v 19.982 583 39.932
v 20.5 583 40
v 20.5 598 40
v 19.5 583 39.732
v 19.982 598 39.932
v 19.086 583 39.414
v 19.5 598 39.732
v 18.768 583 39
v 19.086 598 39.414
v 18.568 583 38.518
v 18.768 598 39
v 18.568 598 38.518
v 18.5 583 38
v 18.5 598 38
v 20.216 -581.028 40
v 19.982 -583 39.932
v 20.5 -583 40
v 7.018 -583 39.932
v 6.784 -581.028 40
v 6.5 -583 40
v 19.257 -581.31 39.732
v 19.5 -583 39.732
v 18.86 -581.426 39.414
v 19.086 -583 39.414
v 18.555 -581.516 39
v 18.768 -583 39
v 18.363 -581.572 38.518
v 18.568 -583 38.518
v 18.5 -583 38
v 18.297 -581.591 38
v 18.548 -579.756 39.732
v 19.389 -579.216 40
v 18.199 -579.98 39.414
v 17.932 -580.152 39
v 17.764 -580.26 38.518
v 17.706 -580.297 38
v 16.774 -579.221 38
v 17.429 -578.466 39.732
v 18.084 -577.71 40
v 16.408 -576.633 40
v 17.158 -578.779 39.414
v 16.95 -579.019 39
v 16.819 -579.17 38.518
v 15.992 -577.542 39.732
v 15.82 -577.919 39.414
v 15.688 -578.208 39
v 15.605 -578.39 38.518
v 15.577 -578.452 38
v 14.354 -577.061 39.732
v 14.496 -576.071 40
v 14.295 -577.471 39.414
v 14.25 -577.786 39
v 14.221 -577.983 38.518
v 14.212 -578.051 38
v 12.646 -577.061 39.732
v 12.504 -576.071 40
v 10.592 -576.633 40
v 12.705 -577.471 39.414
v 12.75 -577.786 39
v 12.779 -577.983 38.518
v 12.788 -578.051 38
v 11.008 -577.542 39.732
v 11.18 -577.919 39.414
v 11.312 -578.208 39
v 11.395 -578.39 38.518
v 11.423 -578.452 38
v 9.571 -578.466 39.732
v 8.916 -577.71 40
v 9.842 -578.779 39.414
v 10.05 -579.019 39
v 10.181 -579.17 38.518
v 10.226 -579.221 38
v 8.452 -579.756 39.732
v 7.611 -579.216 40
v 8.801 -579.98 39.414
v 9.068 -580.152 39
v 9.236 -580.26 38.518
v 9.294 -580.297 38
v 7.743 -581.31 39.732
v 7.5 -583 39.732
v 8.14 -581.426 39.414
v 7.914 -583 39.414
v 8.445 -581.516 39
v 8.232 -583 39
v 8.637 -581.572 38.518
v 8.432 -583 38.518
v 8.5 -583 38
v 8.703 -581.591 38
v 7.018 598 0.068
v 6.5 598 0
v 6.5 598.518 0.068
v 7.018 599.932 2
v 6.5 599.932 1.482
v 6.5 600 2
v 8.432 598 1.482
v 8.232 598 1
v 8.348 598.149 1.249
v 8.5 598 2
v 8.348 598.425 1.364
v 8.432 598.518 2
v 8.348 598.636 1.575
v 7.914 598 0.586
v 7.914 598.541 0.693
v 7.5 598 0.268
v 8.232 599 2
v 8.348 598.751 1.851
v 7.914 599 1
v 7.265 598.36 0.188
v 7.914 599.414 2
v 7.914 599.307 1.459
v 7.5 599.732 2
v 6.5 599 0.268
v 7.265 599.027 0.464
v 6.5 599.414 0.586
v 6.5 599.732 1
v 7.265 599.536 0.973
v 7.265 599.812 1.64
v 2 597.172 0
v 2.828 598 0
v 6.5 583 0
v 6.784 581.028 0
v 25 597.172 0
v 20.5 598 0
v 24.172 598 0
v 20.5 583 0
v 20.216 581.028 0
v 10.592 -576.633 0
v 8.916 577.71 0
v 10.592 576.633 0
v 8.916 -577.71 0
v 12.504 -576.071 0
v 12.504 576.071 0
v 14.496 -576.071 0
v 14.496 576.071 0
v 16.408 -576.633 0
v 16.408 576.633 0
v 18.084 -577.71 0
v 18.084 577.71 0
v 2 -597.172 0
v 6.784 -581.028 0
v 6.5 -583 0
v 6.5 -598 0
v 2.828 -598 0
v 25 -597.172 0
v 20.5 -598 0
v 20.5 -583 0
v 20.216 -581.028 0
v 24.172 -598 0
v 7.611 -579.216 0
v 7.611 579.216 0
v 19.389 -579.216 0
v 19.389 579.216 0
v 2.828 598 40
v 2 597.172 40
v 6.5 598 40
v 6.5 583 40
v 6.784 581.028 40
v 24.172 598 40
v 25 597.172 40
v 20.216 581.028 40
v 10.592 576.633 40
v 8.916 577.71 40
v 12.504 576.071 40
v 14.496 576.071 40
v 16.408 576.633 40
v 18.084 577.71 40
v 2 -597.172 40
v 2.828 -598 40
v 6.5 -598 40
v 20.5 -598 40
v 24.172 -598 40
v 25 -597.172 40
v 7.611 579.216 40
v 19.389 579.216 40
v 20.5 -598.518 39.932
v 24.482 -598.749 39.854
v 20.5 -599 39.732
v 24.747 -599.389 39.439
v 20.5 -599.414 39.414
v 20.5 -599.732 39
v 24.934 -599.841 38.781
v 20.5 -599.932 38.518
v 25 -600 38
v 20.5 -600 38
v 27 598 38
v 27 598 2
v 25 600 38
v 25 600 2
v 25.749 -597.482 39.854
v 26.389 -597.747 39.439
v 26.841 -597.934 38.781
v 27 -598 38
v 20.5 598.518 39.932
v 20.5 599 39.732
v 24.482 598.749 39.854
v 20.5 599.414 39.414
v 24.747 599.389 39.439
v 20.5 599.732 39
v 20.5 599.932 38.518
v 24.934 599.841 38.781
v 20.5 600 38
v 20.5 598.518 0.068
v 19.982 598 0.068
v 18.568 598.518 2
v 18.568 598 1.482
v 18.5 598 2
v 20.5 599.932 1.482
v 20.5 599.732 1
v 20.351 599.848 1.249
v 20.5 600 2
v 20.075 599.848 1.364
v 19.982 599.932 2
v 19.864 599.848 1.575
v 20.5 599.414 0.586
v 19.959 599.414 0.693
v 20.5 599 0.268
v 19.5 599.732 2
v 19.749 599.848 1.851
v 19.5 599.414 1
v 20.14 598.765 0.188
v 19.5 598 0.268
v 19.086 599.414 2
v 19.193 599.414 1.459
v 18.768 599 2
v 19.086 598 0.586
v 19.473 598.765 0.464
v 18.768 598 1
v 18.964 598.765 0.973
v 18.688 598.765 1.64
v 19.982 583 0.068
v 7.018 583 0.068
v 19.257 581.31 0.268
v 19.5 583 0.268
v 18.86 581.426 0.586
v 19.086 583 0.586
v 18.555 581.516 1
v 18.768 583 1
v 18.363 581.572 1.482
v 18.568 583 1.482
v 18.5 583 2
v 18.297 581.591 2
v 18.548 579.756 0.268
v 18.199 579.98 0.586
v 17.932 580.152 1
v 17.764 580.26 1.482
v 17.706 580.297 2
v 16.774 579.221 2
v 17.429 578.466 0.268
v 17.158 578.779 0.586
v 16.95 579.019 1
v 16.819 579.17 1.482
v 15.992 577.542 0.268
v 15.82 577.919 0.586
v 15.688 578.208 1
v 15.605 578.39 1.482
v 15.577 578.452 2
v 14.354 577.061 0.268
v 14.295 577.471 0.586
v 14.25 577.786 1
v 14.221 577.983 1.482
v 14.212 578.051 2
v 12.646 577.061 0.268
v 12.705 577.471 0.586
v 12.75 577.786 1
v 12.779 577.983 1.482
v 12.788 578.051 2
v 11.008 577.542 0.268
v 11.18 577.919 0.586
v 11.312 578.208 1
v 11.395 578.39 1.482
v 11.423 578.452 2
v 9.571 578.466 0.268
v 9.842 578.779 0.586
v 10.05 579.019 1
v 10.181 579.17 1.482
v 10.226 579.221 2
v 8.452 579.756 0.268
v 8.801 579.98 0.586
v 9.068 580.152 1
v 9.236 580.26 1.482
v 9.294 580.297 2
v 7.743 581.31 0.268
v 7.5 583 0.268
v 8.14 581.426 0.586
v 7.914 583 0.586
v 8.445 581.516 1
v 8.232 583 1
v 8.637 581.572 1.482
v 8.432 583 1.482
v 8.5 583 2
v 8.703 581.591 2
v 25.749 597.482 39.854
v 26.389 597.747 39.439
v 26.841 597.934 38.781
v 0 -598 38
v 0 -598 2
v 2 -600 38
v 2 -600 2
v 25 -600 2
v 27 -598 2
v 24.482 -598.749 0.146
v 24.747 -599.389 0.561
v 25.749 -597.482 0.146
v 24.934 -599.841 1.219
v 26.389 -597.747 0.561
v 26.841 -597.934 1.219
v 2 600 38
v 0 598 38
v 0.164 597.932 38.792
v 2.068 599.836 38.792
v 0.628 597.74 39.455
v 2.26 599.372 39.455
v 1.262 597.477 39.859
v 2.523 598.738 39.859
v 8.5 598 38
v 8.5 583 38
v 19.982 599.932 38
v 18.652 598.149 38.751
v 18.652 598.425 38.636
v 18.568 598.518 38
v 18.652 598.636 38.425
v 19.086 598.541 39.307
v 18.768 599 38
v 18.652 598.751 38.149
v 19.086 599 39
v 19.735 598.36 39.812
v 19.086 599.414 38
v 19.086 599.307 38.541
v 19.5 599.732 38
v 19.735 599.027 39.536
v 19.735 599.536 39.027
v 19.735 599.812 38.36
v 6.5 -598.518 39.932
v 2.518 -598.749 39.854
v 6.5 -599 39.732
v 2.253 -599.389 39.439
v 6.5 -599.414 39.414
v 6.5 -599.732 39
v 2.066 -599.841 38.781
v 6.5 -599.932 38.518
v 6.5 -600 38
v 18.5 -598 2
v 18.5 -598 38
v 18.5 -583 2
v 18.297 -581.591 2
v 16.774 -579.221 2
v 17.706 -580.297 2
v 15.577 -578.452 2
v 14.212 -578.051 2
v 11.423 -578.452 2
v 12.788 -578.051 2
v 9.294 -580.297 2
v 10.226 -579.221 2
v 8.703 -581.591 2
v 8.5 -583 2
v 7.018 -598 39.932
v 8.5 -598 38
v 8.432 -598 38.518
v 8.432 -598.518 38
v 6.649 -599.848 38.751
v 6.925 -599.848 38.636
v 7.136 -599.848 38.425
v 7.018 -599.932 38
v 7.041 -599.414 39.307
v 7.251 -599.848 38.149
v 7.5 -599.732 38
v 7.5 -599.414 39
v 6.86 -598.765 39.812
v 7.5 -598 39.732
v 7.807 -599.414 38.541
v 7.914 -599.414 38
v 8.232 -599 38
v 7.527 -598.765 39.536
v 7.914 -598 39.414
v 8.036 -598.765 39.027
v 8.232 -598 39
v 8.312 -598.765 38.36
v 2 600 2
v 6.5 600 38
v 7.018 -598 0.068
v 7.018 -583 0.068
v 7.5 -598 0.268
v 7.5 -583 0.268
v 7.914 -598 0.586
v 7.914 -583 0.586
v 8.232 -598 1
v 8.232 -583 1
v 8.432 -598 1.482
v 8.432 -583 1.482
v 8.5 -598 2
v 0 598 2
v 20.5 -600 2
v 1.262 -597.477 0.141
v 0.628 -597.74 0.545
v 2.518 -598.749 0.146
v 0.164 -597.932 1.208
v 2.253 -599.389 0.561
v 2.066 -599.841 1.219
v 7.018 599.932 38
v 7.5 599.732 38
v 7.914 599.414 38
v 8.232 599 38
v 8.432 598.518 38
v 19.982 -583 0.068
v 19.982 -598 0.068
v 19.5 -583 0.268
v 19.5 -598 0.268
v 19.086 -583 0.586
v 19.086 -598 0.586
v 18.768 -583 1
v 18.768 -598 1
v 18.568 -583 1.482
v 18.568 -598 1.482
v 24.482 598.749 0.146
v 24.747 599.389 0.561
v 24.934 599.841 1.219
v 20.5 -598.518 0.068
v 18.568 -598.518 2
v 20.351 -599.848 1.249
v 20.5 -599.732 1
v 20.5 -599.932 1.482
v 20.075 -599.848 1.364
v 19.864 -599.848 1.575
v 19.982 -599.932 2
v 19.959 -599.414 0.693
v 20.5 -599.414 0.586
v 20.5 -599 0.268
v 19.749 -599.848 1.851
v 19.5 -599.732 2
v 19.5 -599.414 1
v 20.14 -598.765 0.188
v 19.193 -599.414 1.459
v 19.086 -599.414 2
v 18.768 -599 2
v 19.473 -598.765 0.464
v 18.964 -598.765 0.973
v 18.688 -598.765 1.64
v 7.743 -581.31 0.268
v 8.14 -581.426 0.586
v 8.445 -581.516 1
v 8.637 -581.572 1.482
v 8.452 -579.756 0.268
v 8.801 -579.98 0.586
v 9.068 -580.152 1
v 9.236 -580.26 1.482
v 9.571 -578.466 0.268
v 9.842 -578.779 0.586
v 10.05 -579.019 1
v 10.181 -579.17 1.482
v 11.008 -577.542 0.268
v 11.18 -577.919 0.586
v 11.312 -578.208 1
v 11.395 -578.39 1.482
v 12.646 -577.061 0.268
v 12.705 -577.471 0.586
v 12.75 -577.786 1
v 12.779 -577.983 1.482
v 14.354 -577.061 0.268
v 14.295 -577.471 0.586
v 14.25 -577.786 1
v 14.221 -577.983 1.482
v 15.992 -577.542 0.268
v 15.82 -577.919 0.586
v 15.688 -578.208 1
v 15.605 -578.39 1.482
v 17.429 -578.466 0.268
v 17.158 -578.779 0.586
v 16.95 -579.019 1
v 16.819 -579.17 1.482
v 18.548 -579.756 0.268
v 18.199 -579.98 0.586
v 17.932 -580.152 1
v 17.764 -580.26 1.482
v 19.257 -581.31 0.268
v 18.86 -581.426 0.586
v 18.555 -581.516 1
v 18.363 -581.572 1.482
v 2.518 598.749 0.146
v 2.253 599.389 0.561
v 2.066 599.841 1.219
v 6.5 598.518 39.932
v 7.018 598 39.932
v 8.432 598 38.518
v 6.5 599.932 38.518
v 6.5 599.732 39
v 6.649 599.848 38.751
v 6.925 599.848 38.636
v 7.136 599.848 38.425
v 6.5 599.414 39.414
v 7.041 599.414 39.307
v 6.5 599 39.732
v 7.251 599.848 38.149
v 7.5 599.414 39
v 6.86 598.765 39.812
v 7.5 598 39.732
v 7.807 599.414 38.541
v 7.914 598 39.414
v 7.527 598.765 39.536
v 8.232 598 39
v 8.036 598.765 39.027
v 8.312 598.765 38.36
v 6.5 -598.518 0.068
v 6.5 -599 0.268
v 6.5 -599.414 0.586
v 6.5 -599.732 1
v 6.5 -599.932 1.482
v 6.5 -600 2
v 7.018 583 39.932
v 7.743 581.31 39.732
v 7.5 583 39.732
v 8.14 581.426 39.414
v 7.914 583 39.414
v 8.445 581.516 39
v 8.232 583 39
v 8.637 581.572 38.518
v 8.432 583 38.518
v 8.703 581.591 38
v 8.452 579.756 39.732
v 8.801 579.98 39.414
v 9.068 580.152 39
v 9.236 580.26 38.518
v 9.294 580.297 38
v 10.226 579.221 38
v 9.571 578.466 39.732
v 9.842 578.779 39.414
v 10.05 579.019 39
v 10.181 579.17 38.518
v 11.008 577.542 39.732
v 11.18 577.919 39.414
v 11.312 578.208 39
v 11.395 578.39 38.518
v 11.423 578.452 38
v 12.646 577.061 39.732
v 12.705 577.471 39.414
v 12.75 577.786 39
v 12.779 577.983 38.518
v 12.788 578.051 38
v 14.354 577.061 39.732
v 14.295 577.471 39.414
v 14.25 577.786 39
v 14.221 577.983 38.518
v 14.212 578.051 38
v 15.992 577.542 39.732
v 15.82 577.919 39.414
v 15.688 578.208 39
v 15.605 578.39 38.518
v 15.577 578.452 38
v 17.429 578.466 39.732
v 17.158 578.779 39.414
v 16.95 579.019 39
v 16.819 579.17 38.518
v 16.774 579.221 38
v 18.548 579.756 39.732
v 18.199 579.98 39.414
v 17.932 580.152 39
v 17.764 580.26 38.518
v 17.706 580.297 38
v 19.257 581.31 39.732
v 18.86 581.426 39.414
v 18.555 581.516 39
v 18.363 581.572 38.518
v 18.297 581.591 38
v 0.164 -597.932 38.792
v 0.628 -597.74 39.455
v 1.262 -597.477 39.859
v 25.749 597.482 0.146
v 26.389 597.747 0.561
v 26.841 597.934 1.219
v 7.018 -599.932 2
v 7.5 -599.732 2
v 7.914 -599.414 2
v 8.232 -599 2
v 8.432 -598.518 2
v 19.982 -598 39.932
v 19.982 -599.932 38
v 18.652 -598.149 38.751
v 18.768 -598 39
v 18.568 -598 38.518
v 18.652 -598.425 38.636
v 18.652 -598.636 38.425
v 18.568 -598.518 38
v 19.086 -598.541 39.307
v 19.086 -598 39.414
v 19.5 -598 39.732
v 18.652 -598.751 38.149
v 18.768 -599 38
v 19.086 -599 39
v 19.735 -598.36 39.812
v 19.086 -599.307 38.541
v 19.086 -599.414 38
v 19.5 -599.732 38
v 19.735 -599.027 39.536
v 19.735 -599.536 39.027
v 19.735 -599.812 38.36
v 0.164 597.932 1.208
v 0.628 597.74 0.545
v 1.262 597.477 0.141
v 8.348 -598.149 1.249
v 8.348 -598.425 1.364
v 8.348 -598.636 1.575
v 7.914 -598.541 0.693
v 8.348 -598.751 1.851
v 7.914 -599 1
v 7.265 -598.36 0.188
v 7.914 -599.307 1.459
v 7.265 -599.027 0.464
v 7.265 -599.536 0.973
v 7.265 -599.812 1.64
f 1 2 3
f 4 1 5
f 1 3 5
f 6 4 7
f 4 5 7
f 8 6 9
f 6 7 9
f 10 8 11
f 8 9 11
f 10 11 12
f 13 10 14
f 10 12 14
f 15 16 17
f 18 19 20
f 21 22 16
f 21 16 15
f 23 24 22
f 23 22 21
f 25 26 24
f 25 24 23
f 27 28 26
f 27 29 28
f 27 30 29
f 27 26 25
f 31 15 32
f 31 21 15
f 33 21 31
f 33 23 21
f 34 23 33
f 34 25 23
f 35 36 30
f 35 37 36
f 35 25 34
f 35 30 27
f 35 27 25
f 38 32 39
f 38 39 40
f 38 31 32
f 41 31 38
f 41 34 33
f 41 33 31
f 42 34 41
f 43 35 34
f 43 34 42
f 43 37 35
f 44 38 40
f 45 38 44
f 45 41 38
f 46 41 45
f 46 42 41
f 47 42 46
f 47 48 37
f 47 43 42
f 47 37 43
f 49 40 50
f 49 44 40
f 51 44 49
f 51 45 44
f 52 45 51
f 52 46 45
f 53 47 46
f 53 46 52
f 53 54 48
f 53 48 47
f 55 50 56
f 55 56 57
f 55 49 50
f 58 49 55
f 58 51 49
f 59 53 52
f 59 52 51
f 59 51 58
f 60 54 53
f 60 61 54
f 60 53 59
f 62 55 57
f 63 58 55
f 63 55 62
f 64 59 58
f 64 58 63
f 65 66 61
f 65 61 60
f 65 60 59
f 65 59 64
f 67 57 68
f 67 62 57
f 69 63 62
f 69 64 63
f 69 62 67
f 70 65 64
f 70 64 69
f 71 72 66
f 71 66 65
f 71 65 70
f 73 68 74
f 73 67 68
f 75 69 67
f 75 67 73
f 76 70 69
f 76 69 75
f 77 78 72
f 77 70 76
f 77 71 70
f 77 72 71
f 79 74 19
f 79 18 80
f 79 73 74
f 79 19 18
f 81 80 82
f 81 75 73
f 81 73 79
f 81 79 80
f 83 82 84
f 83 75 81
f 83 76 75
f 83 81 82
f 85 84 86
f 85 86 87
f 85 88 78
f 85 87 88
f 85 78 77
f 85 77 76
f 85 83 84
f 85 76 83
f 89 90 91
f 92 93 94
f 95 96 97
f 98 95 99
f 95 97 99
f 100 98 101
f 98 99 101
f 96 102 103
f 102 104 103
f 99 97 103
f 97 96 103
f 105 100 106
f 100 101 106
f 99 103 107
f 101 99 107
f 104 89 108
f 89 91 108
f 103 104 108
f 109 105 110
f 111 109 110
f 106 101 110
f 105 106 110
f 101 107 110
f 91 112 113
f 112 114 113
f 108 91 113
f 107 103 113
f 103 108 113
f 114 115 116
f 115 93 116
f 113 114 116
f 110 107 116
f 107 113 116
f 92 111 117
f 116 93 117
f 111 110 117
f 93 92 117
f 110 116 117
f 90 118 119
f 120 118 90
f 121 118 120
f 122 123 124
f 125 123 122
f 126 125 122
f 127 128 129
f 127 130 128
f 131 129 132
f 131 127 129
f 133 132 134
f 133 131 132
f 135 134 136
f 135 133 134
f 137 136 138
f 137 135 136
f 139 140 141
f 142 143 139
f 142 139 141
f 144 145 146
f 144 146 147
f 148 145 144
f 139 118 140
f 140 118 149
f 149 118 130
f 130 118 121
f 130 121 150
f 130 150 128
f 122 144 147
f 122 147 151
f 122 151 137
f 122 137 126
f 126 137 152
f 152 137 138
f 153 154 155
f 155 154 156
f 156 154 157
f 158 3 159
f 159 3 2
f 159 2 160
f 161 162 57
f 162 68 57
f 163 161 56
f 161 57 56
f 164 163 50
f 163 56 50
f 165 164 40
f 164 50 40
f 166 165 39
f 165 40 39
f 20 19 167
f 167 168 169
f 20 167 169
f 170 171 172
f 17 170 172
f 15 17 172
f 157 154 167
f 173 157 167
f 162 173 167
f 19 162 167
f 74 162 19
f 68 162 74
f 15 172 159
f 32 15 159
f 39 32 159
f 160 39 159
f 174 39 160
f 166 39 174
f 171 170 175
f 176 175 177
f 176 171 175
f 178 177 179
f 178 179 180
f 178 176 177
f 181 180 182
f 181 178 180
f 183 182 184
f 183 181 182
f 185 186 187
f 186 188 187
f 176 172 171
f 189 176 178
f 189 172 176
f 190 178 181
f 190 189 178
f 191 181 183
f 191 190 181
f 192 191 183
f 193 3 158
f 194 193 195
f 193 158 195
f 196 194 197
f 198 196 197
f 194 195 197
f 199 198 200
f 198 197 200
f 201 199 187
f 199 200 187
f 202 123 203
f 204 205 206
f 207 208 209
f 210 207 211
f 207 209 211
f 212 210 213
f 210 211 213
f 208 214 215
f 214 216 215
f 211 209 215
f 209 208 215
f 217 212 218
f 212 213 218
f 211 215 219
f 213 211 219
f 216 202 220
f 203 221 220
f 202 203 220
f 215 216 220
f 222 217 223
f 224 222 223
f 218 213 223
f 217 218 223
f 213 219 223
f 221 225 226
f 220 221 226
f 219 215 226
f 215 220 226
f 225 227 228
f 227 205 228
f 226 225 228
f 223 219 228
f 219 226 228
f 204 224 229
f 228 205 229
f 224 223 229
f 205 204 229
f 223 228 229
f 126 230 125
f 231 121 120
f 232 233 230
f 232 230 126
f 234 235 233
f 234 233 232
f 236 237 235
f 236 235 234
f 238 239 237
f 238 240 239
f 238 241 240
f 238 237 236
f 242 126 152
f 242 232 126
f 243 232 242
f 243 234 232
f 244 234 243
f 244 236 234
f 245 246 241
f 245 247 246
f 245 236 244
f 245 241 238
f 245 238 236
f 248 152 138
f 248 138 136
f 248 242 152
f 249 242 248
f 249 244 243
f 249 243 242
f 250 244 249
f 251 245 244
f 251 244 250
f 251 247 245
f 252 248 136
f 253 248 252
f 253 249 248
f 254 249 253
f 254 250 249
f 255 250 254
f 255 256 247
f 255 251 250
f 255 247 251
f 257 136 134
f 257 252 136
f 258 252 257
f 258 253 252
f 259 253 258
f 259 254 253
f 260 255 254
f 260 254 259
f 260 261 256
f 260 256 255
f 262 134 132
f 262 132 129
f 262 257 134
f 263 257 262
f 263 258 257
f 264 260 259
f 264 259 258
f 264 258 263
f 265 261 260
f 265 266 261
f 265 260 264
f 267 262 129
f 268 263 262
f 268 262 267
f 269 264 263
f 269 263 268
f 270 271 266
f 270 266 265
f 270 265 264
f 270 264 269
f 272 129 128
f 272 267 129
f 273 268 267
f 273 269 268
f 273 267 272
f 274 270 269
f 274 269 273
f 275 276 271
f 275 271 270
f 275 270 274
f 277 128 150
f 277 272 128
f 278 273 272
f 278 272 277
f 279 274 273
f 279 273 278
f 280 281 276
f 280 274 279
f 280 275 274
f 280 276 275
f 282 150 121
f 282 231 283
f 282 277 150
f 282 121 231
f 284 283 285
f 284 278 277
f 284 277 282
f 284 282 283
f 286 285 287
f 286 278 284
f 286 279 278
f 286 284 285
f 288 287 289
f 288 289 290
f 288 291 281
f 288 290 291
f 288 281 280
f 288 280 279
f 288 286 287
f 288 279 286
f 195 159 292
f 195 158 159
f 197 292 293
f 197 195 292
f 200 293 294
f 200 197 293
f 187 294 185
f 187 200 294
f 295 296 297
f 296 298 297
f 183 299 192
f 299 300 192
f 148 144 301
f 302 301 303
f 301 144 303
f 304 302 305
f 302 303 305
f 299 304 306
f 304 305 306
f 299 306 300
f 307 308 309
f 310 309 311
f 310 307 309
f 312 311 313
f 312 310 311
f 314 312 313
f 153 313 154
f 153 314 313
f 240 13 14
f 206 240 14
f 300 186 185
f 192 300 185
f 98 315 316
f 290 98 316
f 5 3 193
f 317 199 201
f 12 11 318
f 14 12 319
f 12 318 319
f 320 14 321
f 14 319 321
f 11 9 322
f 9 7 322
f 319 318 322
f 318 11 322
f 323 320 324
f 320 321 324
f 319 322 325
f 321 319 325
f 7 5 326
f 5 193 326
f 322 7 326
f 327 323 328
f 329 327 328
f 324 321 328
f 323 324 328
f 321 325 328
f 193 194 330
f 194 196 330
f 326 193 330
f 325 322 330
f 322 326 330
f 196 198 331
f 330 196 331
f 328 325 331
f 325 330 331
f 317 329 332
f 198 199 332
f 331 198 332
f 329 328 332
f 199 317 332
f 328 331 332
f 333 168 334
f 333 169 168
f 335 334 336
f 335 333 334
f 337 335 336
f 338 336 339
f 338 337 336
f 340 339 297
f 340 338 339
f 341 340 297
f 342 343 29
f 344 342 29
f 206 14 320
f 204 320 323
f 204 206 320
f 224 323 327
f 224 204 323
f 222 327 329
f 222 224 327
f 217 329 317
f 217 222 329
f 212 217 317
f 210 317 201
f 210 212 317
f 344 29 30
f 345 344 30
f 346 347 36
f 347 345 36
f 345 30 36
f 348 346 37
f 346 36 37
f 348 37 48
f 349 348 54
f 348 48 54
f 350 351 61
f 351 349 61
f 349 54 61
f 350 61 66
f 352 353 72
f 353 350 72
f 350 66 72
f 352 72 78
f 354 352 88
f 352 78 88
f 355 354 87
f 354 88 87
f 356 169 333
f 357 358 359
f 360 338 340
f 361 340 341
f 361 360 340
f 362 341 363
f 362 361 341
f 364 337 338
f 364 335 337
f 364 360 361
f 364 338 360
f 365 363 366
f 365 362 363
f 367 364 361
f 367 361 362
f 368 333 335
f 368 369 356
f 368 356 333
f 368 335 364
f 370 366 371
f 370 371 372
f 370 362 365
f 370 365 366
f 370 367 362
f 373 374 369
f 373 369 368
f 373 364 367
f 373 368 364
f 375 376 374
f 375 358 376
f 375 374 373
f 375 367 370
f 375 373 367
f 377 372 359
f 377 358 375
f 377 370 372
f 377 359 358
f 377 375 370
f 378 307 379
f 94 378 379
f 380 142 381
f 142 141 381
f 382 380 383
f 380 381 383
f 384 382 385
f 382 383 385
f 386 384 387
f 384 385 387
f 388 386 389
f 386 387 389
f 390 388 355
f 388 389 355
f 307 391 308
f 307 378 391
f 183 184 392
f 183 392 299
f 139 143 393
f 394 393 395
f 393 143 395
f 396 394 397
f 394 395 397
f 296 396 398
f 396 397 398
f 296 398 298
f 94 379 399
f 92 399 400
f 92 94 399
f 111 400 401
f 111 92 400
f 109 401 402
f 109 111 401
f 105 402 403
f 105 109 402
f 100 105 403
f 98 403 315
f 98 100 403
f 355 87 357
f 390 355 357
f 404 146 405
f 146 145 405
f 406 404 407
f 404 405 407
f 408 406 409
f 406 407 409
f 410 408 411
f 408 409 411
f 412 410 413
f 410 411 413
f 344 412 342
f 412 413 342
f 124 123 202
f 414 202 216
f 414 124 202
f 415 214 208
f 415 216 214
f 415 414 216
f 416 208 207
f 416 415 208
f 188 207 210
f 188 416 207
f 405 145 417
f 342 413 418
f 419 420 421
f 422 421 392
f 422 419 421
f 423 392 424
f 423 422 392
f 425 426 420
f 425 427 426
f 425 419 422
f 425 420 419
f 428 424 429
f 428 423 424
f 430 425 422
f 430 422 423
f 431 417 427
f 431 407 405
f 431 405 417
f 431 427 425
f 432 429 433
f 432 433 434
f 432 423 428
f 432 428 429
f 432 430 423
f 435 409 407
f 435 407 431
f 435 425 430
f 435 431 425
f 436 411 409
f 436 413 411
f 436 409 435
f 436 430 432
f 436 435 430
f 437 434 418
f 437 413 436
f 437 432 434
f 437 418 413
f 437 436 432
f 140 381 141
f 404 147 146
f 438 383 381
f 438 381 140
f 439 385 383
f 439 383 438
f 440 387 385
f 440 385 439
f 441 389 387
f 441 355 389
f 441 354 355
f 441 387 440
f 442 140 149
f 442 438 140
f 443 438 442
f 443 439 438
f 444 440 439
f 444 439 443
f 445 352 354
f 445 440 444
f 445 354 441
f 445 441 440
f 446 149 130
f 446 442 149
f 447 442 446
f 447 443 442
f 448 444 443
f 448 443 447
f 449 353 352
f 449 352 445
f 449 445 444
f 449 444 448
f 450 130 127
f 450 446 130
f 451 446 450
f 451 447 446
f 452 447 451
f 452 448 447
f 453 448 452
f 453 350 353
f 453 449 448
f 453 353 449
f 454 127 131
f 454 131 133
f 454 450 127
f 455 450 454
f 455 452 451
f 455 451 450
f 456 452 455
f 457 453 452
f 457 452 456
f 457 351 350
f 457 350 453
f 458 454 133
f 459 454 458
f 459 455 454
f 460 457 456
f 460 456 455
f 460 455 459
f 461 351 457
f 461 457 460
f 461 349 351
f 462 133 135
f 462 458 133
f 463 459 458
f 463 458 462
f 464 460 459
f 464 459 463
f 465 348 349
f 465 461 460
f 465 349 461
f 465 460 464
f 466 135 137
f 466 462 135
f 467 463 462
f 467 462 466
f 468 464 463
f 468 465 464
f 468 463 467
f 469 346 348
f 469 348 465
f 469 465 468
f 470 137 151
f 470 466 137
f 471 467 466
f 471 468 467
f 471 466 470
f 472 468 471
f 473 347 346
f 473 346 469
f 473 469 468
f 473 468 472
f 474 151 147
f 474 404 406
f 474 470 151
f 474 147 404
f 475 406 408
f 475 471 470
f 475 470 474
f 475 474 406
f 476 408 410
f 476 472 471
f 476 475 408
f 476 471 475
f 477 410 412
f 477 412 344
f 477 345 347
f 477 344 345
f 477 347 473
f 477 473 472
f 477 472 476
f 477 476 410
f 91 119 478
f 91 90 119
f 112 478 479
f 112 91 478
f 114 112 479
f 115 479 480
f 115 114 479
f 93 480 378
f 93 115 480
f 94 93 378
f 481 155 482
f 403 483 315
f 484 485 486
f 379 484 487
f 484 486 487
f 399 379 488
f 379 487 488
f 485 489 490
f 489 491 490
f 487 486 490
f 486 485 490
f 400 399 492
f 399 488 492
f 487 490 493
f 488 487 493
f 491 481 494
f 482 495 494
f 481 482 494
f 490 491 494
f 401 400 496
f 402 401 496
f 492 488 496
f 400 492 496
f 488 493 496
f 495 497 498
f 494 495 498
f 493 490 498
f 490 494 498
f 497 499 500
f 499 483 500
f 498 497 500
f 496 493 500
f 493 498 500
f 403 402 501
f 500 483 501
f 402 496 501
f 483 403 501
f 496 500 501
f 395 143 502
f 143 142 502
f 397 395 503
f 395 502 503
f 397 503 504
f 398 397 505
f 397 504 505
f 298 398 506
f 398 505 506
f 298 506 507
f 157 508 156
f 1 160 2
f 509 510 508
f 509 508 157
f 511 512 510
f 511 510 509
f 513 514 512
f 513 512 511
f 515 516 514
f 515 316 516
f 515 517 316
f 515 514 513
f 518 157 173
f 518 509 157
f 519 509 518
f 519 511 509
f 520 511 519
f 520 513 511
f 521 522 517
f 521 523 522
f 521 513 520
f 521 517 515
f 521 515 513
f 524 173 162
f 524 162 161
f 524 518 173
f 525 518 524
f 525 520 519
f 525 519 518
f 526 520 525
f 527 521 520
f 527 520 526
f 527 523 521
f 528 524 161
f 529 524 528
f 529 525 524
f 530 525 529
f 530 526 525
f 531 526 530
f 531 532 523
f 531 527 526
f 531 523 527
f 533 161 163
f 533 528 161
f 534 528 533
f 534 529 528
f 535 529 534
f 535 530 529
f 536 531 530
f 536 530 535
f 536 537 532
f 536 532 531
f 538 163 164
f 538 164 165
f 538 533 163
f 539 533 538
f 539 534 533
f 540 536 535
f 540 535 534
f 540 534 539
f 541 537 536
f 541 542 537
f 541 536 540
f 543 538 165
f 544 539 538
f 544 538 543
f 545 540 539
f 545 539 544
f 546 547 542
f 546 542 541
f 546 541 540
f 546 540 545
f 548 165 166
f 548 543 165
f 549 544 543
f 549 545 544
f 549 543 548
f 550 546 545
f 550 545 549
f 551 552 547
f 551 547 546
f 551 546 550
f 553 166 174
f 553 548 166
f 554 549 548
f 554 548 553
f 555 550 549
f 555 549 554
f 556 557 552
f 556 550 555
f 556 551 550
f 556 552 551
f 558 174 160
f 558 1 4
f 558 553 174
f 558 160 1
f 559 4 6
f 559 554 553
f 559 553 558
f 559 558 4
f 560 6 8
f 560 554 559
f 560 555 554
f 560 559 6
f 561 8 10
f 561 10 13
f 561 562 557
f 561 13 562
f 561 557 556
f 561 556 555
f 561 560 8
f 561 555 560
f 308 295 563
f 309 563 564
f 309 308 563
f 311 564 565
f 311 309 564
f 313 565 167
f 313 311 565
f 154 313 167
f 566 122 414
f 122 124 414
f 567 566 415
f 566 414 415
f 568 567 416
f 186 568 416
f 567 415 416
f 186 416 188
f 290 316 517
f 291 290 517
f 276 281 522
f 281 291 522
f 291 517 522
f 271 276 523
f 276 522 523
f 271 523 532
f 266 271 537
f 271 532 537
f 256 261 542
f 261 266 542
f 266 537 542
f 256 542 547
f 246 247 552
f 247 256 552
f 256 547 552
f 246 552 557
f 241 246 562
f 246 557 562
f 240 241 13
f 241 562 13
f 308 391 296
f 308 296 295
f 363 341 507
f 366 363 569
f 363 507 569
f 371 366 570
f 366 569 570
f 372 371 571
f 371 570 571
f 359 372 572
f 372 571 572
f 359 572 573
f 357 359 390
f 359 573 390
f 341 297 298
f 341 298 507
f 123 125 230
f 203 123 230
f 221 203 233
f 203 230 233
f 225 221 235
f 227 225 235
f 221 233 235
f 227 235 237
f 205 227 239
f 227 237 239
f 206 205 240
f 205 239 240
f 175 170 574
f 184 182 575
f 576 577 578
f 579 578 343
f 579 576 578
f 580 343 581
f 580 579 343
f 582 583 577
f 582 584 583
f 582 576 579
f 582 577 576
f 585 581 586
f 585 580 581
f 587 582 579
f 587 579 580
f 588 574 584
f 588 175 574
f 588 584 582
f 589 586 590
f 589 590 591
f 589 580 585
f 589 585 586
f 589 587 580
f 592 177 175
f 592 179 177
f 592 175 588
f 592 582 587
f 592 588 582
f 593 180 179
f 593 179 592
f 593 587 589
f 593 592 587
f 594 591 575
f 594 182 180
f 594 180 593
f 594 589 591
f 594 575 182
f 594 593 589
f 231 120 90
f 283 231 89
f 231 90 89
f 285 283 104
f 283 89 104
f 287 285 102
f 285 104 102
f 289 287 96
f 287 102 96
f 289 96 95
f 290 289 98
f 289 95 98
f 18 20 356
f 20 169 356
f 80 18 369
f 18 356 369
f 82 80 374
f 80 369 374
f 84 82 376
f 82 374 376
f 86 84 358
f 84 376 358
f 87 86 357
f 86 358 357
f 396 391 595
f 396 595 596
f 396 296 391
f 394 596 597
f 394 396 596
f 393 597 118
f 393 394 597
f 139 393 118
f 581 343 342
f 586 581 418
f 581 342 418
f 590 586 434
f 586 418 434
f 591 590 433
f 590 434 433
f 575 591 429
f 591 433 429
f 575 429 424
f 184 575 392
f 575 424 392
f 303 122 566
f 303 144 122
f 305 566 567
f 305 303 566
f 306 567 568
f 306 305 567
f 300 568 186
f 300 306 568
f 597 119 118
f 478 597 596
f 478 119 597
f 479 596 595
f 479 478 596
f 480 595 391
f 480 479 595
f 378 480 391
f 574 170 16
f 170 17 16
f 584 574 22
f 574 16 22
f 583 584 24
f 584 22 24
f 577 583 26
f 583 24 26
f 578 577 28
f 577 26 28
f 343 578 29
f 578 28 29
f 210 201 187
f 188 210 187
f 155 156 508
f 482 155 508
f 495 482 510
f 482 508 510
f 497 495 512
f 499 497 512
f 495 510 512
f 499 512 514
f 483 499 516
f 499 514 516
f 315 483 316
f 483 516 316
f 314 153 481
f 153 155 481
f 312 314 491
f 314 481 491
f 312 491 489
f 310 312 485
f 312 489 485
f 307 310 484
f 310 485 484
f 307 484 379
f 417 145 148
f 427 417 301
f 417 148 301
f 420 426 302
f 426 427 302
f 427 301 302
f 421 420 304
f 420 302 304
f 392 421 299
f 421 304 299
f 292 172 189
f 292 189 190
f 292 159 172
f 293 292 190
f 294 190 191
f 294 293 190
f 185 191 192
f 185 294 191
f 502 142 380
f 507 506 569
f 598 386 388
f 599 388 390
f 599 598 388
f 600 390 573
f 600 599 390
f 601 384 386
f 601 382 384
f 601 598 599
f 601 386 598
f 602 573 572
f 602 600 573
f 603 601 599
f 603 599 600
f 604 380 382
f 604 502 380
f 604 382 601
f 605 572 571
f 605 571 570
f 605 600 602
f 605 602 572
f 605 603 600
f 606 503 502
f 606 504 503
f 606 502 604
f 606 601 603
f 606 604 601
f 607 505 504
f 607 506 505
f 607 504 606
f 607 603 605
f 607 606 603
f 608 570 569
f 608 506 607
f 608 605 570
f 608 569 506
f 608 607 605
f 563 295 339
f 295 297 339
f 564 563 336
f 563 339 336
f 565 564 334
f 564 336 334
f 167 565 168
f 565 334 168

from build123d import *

# Parameters (mm, degrees)
F0_W     = 27
F0_H     = 40
F1_DEPTH = 600
F3_DEPTH = 40.001
F4_DEPTH = 40.001
F5_SIZE  = 2
F6_R     = 2


with BuildPart() as f1:
    # F0 (on Front) → F1 (new body, symmetric)
    with BuildSketch(Plane.XZ):
        with Locations((13.5, 20)):
            Rectangle(F0_W, F0_H)
    extrude(amount=F1_DEPTH, both=True)

    # F2 (on face) → F3 (cut, through all)
    with BuildSketch(Plane.XY.offset(40)):
        with BuildLine():
            Line((18.5, -600), (18.5, -583))
            ThreePointArc((18.5, -583), (13.5, -578), (8.5, -583))
            Line((8.5, -583), (8.5, -600))
            Line((8.5, -600), (18.5, -600))
        make_face()
    extrude(amount=-F3_DEPTH, mode=Mode.SUBTRACT)

    # F2 (on face) → F4 (cut, through all)
    with BuildSketch(Plane.XY.offset(40)):
        with BuildLine():
            Line((18.5, -600), (18.5, -583))
            ThreePointArc((18.5, -583), (13.5, -578), (8.5, -583))
            Line((8.5, -583), (8.5, -600))
            Line((8.5, -600), (18.5, -600))
        make_face()
        with BuildLine():
            ThreePointArc((8.5, 583), (13.5, 578), (18.5, 583))
            Line((18.5, 583), (18.5, 600))
            Line((18.5, 600), (8.5, 600))
            Line((8.5, 600), (8.5, 583))
        make_face()
    extrude(amount=-F4_DEPTH, mode=Mode.SUBTRACT)

    # F5
    f5_edges = [f1.edges().sort_by_distance(p)[0] for p in [
        (0, -600, 20),
        (27, -600, 20),
        (0, 600, 20),
        (27, 600, 20),
    ]]
    chamfer(f5_edges, length=F5_SIZE)

    # F6
    f6_edges = [f1.edges().sort_by_distance(p)[0] for p in [
        (21.75, -600, 40),
        (26, -599, 40),
        (18.5, -591.5, 40),
        (27, 0, 40),
        (13.5, -578, 40),
        (26, 599, 40),
        (8.5, -591.5, 40),
        (21.75, 600, 40),
        (5.25, -600, 40),
        (18.5, 591.5, 40),
        (1, -599, 40),
        (13.5, 578, 40),
        (0, 0, 40),
        (8.5, 591.5, 40),
        (1, 599, 40),
        (5.25, 600, 40),
        (0, 0, 0),
        (1, 599, 0),
        (1, -599, 0),
        (5.25, 600, 0),
        (5.25, -600, 0),
        (8.5, 591.5, 0),
        (8.5, -591.5, 0),
        (13.5, 578, 0),
        (13.5, -578, 0),
        (18.5, 591.5, 0),
        (18.5, -591.5, 0),
        (21.75, 600, 0),
        (21.75, -600, 0),
        (26, 599, 0),
        (26, -599, 0),
        (27, 0, 0),
        (18.5, 600, 20),
        (8.5, 600, 20),
        (18.5, -600, 20),
        (8.5, -600, 20),
    ]]
    fillet(f6_edges, radius=F6_R)


solid = f1.part
